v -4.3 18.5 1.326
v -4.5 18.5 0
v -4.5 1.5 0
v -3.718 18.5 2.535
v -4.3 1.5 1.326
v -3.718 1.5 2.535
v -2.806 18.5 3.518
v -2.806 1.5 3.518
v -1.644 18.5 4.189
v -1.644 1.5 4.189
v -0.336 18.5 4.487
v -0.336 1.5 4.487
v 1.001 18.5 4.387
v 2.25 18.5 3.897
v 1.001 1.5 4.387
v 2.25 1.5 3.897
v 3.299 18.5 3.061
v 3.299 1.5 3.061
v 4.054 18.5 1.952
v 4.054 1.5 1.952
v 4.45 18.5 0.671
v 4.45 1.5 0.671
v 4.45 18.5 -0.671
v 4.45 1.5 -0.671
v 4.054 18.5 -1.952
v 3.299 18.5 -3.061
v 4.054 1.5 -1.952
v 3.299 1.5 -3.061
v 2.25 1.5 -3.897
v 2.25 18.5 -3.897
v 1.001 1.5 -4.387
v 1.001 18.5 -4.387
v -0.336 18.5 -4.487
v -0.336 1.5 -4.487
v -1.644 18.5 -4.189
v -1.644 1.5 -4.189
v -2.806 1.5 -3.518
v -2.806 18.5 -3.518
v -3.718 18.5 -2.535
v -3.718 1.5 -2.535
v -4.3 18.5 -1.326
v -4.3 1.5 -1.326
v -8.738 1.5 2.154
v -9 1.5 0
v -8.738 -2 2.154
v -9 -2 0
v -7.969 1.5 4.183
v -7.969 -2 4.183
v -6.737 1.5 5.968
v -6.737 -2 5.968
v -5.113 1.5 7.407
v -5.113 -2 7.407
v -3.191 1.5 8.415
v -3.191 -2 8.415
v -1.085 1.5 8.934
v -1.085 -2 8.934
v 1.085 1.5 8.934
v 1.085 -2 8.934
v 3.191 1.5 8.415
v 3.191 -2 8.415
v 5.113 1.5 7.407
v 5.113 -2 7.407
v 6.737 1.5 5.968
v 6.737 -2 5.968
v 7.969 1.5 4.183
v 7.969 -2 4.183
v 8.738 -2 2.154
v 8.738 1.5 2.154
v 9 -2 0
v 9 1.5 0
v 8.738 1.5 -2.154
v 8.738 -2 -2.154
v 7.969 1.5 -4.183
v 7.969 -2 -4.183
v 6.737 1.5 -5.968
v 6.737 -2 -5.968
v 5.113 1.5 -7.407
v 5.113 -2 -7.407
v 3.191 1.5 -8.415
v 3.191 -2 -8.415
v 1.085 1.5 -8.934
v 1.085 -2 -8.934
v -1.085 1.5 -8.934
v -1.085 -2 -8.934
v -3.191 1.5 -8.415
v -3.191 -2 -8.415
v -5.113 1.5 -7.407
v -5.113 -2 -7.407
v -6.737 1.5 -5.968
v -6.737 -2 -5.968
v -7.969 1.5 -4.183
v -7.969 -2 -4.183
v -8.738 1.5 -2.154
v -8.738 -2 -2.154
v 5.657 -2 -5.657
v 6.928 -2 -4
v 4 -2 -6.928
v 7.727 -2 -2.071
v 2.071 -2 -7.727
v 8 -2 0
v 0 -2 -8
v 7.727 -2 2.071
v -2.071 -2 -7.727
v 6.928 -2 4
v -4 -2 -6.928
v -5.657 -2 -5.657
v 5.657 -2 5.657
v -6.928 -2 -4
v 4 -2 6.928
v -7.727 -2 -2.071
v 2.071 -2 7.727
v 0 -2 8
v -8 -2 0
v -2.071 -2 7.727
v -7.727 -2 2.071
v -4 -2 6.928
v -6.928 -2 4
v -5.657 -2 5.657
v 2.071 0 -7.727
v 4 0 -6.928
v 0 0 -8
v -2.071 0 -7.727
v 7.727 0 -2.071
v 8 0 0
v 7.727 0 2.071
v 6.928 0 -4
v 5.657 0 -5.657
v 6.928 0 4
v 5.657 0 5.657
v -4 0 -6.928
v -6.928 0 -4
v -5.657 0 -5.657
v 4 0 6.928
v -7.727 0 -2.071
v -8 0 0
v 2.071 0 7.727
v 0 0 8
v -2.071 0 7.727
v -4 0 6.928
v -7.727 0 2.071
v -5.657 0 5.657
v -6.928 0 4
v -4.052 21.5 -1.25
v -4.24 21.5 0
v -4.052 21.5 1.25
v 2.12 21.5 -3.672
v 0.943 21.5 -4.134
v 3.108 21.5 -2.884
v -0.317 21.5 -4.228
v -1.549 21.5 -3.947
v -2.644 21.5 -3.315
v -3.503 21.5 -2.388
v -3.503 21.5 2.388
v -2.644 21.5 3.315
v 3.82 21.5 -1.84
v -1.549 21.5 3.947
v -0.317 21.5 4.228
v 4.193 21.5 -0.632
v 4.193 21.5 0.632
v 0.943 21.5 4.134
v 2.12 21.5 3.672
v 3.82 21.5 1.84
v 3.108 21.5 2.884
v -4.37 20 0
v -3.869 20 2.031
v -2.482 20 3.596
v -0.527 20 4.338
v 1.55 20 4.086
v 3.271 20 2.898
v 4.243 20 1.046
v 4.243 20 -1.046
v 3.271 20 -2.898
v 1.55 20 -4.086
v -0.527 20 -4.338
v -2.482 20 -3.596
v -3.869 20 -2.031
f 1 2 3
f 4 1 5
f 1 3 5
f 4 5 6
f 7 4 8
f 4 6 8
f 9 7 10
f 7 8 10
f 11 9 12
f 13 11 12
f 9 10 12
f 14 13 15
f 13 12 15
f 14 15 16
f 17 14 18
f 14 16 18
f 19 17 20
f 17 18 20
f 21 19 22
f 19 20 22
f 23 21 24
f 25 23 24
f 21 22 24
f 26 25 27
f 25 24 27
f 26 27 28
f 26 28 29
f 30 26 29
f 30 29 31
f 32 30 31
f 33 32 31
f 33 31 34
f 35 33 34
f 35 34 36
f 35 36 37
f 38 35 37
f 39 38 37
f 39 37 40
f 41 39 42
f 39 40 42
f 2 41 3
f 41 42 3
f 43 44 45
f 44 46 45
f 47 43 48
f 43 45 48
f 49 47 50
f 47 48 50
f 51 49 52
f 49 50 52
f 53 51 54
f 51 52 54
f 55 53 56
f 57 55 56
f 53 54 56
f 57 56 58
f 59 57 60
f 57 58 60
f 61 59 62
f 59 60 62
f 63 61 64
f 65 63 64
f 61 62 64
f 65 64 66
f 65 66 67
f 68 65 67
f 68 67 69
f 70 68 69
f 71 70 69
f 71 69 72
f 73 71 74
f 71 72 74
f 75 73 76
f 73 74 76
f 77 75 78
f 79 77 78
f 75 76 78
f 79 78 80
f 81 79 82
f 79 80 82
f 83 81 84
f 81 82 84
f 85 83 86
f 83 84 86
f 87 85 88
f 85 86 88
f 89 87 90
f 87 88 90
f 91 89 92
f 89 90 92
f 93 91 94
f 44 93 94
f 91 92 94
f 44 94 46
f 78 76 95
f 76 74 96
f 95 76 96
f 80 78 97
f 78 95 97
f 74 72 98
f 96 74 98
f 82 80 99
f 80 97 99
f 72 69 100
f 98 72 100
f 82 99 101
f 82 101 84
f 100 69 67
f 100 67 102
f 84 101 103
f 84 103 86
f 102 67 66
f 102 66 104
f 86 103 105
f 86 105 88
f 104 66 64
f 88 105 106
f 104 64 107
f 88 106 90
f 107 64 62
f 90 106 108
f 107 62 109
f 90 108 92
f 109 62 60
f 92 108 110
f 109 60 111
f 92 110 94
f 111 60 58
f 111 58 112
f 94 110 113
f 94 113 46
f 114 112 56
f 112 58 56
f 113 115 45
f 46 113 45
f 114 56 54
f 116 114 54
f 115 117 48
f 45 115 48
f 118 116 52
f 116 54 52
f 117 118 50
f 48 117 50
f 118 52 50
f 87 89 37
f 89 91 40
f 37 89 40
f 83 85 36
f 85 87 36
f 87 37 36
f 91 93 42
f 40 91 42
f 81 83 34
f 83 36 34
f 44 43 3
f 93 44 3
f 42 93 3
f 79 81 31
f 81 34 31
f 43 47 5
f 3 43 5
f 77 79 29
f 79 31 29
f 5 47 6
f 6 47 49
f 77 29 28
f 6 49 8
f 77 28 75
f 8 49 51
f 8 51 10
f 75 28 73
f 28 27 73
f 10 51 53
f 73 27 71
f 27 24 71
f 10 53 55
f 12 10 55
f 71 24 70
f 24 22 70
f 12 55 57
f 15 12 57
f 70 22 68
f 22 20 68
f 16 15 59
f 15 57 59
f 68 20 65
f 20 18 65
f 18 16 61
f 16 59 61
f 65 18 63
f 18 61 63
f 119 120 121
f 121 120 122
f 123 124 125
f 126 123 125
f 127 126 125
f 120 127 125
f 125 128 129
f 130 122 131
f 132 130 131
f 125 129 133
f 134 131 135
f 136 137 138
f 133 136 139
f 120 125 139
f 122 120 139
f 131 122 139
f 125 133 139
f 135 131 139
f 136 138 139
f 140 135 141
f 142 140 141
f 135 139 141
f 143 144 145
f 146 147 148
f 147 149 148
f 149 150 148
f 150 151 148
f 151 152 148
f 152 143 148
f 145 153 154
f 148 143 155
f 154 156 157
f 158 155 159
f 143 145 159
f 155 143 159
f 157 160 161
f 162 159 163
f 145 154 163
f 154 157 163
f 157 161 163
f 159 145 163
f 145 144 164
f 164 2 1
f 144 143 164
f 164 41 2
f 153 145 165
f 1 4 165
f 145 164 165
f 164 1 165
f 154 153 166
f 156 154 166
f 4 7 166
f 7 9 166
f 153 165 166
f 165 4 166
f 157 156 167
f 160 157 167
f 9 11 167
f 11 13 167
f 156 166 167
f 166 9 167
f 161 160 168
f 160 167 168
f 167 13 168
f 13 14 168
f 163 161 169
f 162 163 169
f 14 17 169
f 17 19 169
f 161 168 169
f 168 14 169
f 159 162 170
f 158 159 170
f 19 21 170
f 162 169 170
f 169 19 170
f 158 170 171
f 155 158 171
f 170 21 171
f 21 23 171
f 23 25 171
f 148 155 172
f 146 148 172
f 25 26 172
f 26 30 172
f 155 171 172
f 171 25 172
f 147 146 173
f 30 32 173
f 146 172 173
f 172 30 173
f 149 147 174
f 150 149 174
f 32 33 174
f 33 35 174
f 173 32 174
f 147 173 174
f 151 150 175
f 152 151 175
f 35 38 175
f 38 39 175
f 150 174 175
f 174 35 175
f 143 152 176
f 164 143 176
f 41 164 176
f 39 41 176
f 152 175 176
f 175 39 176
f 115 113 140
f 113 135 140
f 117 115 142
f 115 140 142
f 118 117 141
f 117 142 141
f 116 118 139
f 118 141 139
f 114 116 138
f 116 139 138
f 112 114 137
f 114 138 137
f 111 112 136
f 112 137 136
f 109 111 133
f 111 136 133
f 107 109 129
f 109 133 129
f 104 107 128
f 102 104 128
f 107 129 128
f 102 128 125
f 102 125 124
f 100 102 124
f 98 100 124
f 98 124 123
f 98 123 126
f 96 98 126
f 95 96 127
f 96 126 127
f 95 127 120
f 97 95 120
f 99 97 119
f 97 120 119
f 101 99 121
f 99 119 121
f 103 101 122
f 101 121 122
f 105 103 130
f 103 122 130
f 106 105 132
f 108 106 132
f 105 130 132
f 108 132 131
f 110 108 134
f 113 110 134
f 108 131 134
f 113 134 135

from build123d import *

# Parameters (mm, degrees)
CHAMFER_1_SIZE  = 0.26
CHAMFER_1_SIZE2 = 3


with BuildPart() as part:
    # Эскиз1 → Повернуть1 (revolve)
    with BuildSketch(Plane.XY):
        Polygon((0, 0), (0, 21.5), (-4.5, 21.5), (-4.5, 1.5), (-9, 1.5), (-9, -2), (-8, -2), (-8, 0), align=None)
    revolve(axis=Axis((0, 0, 0), (0, 1, 0)))

    # Фаска1
    chamfer_1_edges = [part.edges().sort_by_distance(p)[0] for p in [
        (4.5, 21.5, 0),
    ]]
    chamfer_1_side = [part.faces().sort_by_distance(p)[0] for p in [
        (0, 21.5, 0),
    ]]
    chamfer(chamfer_1_edges, length=CHAMFER_1_SIZE, length2=CHAMFER_1_SIZE2, reference=chamfer_1_side[0])


solid = part.part
